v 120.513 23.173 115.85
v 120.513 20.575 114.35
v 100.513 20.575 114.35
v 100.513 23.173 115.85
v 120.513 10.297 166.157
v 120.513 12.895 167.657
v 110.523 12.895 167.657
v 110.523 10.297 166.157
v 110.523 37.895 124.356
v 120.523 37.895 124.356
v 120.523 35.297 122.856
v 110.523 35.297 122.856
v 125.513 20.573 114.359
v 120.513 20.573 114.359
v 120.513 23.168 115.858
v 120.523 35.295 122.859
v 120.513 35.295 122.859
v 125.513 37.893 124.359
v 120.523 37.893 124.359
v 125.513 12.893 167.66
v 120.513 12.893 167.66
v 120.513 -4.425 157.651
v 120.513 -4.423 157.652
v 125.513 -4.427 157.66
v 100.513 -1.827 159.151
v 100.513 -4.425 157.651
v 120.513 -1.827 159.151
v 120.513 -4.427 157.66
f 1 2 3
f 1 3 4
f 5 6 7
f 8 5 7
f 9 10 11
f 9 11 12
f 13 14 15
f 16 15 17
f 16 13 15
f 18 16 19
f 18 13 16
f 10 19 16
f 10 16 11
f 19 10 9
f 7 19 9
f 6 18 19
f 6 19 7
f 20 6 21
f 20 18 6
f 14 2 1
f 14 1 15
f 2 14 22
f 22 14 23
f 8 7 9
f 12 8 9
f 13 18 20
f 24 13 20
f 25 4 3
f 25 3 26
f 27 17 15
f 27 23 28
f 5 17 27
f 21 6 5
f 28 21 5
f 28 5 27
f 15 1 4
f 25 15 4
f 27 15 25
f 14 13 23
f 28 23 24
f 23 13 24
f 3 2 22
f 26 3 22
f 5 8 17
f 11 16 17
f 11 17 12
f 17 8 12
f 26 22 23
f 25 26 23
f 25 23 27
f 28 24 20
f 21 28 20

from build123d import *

# Parameters (mm, degrees)
SKETCH066_W             = 50
SKETCH066_H             = 20
PAD065_DEPTH            = 5
SKETCH067_W             = 50
SKETCH067_H             = 3
PAD066_DEPTH            = 20
SKETCH068_W             = 50
SKETCH068_H             = 10
PAD067_DEPTH            = 3
BODY046_ROLL_ANGLE      = 90
BODY046_PITCH_ANGLE     = -60
BODY046_PLACEMENT_ANGLE = -90


with BuildPart() as part:
    # Sketch066 → Pad065 (new body)
    with BuildSketch(Plane.XY):
        with Locations((184.845276, -123.914059)):
            Rectangle(SKETCH066_W, SKETCH066_H)
    extrude(amount=PAD065_DEPTH)

    # Sketch067 (on Face6 of Pad065) → Pad066 (join)
    with BuildSketch(Plane.XY.offset(5)):
        with Locations((184.83606, -132.417099)):
            Rectangle(SKETCH067_W, SKETCH067_H)
    extrude(amount=PAD066_DEPTH)

    # Sketch068 (on Face7 of Pad066) → Pad067 (join)
    with BuildSketch(Plane(origin=(0, -113.914059, 0), x_dir=(-1, 0, 0), z_dir=(0, 1, 0))):
        with Locations((-184.841869, 9.989668)):
            Rectangle(SKETCH068_W, SKETCH068_H)
    extrude(amount=-PAD067_DEPTH)


with BuildPart() as part_1:
    # Body046 roll: moved
    add(part.part.rotate(Axis((0, 0, 0), (1, 0, 0)), BODY046_ROLL_ANGLE))


with BuildPart() as part_2:
    # Body046 pitch: moved
    add(part_1.part.rotate(Axis((0, 0, 0), (0, 1, 0)), BODY046_PITCH_ANGLE))


with BuildPart() as part_3:
    # Body046 placement: moved
    add(part_2.part.moved(Location((125.51314, 216.468461, 42.886067))).rotate(Axis((125.51314, 216.468461, 42.886067), (0, 0, 1)), BODY046_PLACEMENT_ANGLE))


solid = part_3.part
